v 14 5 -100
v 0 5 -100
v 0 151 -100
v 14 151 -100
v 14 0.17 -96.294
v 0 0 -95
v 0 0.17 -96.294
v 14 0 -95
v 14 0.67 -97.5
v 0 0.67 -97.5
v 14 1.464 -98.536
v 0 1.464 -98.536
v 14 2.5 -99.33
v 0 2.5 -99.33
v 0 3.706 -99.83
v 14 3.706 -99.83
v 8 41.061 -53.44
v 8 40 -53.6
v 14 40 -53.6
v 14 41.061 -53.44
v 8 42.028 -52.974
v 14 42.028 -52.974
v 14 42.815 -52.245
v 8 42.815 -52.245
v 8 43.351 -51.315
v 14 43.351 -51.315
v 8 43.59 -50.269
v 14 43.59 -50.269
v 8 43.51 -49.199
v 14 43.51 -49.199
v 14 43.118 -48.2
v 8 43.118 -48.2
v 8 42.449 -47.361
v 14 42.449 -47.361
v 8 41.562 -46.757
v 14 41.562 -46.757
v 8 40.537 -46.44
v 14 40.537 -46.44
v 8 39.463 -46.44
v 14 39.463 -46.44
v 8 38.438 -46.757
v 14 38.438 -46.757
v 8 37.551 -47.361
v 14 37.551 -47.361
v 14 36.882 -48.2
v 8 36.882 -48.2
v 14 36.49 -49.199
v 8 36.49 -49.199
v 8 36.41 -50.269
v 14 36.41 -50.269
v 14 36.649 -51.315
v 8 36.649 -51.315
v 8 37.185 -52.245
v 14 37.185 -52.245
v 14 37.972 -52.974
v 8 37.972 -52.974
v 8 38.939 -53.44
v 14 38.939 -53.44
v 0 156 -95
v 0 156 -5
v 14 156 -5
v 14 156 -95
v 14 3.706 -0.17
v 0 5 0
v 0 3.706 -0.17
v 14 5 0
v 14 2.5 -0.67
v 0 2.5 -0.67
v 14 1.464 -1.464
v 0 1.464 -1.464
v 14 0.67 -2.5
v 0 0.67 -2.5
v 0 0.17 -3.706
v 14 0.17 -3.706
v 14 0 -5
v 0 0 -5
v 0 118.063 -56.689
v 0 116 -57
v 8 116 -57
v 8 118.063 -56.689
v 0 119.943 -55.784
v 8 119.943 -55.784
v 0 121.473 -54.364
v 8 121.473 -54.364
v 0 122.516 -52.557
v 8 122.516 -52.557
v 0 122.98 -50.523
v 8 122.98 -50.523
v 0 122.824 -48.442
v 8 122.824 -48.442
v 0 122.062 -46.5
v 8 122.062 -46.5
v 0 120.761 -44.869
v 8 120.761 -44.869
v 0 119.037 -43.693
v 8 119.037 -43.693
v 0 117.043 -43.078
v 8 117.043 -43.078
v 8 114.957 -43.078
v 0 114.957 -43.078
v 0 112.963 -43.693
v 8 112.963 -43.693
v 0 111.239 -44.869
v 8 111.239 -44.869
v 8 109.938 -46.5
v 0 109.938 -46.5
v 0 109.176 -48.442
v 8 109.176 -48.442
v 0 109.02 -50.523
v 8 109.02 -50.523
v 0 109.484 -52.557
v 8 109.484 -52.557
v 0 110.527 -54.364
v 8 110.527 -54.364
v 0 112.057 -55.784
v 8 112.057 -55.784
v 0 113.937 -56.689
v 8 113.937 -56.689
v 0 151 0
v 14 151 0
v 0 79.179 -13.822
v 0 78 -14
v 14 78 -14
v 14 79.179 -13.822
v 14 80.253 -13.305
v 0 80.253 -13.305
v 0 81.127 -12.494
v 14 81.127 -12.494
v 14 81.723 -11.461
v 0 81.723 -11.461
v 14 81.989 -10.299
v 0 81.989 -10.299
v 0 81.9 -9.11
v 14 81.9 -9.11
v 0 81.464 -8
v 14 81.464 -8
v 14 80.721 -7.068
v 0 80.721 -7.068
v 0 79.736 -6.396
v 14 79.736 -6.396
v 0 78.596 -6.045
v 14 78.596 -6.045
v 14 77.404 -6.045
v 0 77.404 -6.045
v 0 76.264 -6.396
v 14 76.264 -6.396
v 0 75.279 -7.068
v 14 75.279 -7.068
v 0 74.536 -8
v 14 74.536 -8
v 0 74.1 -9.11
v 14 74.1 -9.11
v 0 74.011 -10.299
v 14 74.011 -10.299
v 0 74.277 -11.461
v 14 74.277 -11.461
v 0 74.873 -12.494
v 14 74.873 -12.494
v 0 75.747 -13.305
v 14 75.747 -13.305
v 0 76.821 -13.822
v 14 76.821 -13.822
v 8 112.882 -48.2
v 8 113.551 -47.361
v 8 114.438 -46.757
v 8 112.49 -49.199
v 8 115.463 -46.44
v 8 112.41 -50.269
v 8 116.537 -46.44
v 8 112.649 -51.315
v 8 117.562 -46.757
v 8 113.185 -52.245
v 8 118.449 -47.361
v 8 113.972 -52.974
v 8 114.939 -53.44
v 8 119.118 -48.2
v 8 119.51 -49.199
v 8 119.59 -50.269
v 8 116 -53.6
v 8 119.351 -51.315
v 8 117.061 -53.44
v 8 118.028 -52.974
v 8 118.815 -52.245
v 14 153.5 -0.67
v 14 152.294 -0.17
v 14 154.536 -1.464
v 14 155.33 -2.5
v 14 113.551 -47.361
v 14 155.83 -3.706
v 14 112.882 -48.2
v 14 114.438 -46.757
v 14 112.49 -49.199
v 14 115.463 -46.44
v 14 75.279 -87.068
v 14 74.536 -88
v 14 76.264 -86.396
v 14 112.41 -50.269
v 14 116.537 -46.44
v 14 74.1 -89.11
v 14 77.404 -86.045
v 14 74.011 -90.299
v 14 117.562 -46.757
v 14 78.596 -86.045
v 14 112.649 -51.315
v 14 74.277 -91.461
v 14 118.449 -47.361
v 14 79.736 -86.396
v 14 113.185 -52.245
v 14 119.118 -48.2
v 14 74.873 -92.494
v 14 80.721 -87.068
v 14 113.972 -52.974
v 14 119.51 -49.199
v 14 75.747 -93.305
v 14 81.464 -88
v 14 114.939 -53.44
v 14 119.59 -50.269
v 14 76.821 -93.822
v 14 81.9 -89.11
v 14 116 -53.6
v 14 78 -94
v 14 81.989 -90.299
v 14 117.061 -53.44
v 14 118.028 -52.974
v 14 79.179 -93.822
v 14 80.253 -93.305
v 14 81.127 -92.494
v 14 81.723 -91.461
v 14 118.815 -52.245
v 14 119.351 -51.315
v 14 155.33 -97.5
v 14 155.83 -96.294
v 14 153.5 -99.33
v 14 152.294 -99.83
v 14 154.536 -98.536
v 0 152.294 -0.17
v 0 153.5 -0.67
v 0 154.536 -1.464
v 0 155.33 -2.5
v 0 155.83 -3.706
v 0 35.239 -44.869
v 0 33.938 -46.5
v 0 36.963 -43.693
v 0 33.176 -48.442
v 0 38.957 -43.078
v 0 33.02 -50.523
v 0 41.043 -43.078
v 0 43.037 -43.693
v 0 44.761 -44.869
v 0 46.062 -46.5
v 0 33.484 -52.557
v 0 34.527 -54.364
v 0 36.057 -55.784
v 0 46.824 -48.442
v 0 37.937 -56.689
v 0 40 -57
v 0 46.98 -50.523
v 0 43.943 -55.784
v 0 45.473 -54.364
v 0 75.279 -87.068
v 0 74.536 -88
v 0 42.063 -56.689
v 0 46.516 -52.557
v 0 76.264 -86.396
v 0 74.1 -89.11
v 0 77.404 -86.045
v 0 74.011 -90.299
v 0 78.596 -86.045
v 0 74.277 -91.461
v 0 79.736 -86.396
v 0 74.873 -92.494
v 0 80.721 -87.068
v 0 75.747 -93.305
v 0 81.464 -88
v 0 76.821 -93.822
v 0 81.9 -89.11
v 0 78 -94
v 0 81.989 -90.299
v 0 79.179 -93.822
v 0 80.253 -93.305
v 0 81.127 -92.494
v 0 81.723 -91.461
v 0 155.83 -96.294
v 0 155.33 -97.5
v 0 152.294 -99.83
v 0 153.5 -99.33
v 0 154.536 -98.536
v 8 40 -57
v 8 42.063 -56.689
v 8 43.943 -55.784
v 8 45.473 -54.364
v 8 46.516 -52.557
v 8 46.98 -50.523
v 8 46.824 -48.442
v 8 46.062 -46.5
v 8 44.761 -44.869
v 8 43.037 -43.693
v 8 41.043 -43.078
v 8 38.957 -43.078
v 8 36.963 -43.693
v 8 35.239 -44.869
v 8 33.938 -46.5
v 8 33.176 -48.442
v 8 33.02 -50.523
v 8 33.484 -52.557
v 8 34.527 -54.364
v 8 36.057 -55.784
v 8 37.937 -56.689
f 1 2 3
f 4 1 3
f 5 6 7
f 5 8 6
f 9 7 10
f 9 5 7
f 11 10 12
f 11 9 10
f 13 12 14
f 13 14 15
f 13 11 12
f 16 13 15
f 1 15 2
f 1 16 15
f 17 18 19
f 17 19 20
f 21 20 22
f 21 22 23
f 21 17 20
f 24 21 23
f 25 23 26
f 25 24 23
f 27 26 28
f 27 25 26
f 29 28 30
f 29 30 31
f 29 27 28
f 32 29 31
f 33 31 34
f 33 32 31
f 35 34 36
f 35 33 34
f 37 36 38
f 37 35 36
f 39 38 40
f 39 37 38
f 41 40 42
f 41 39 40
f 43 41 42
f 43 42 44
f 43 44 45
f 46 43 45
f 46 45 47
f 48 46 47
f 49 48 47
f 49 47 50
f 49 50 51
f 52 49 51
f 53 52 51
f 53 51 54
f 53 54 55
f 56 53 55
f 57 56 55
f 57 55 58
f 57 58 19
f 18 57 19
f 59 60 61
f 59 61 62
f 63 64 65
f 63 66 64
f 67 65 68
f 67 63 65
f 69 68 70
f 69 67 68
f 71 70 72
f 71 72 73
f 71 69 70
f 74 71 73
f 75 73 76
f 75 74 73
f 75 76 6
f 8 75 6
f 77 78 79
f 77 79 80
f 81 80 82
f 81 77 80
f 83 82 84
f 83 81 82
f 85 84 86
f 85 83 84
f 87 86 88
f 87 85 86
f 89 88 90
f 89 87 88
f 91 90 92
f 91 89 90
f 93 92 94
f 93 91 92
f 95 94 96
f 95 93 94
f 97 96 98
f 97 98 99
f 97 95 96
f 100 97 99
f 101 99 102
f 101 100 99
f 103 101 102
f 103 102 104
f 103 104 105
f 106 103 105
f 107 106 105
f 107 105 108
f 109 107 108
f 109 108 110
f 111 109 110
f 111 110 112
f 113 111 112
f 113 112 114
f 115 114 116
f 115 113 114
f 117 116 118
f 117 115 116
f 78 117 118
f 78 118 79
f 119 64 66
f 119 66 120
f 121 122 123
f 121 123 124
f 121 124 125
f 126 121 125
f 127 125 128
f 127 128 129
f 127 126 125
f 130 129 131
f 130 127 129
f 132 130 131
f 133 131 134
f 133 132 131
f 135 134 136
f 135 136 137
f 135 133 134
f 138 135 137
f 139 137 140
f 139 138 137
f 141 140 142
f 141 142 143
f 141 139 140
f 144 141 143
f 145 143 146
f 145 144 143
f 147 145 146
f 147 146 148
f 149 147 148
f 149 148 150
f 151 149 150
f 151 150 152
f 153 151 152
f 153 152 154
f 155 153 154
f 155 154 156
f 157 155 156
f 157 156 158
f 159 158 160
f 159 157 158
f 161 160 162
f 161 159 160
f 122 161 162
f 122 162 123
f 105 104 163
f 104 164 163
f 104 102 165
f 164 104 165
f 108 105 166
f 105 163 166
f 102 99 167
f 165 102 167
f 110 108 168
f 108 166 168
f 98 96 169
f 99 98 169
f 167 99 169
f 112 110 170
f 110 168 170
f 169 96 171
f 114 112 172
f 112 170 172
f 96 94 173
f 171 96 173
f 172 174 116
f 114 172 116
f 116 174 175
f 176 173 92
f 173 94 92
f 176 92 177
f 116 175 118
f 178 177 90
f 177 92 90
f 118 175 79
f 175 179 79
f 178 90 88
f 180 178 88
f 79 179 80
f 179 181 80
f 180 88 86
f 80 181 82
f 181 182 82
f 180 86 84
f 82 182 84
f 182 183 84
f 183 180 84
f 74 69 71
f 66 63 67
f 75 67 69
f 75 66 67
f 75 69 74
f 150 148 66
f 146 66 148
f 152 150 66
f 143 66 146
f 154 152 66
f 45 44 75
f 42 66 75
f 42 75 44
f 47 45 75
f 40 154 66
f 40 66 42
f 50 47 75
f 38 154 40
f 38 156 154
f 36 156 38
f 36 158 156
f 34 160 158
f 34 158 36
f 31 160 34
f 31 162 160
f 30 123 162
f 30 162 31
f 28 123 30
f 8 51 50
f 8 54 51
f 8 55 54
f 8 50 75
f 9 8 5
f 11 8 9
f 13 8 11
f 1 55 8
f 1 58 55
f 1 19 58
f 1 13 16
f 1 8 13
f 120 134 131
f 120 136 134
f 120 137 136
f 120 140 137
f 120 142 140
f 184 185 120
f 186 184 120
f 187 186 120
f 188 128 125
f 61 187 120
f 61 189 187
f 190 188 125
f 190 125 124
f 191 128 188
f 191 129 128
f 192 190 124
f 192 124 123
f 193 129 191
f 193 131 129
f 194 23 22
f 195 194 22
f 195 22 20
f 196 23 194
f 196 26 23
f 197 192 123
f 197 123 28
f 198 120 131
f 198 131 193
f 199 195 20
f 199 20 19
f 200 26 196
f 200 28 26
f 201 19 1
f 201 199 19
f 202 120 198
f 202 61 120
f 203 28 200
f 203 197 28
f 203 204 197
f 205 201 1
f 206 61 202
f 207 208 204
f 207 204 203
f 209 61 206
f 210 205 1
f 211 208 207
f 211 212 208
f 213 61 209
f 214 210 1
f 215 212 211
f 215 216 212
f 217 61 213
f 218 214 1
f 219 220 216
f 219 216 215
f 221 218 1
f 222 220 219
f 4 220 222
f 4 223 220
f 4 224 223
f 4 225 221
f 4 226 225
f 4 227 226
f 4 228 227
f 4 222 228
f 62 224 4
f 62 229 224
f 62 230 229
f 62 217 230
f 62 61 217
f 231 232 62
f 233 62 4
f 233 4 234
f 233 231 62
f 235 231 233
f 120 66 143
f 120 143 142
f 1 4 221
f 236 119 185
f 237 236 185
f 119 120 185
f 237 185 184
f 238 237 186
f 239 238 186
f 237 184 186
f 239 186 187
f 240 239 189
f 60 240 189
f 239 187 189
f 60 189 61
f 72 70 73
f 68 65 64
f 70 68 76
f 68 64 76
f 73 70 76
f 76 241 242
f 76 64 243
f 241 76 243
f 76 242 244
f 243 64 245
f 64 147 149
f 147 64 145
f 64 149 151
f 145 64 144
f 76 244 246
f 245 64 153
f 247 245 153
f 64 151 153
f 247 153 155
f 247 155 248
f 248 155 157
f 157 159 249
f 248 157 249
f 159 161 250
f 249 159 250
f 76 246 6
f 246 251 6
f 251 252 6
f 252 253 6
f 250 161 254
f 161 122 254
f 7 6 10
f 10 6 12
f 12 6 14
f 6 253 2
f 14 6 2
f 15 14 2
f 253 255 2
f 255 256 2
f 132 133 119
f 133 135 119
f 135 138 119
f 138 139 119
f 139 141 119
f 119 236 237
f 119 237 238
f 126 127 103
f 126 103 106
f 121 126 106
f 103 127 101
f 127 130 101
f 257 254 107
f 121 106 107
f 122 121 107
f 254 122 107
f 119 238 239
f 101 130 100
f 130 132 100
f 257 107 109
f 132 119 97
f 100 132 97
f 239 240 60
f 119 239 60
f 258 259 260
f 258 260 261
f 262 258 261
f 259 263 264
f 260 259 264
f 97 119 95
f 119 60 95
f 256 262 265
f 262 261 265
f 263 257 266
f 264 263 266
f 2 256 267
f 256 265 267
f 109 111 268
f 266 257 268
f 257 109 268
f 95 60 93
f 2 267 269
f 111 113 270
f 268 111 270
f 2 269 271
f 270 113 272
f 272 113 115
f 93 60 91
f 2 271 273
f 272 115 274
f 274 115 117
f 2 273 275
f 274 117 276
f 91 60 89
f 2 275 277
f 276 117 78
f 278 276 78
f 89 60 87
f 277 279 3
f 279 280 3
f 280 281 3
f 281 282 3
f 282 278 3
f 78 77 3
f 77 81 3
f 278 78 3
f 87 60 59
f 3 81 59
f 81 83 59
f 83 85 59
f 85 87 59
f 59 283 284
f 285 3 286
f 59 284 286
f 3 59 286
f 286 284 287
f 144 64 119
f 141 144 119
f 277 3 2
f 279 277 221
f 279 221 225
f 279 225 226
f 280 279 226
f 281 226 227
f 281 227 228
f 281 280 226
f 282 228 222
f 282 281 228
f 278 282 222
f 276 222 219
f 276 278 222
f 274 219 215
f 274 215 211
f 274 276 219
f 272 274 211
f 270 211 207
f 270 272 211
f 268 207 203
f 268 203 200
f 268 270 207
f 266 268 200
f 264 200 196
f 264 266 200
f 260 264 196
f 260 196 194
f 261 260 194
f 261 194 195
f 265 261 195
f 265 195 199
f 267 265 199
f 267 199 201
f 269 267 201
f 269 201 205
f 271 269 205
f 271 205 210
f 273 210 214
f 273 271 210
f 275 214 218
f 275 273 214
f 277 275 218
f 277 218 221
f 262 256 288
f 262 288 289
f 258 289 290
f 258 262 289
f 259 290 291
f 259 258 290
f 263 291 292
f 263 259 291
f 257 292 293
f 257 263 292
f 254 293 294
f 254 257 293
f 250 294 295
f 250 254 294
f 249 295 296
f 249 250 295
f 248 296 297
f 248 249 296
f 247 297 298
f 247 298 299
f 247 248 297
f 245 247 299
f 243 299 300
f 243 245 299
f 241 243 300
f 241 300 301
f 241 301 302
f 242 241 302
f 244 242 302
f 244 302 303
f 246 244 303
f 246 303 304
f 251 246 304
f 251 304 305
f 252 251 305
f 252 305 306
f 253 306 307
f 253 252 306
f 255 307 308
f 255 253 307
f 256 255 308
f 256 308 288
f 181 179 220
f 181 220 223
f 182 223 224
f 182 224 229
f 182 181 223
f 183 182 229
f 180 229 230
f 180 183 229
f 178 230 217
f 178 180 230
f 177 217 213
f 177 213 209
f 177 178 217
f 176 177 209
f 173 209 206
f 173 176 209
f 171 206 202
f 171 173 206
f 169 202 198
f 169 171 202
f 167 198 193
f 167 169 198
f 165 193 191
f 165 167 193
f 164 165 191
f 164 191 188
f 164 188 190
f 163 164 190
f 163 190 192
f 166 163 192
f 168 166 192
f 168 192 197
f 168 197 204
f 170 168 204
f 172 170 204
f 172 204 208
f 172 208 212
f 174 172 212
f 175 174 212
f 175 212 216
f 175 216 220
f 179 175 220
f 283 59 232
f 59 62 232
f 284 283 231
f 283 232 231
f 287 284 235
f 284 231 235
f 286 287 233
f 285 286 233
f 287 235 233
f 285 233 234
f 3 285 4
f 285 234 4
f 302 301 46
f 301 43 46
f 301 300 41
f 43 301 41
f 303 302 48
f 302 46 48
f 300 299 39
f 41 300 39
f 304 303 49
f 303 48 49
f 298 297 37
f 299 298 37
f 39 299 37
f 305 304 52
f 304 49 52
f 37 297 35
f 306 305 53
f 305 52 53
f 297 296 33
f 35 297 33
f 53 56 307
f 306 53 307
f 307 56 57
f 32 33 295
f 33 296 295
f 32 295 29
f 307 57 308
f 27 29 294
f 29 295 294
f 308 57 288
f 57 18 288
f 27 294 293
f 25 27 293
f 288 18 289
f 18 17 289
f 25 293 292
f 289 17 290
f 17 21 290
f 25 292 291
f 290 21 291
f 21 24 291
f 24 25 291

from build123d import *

# Parameters (mm, degrees)
SKETCH1_W           = 100
SKETCH1_H           = 156
SKETCH1_R           = 4
SKETCH1_R_2         = 3.6
BOSS_EXTRUDE1_DEPTH = 14
FILLET1_R           = 5
SKETCH1_3_R         = 7
SKETCH1_3_R_2       = 3.6
CUT_EXTRUDE1_DEPTH  = 8


with BuildPart() as part:
    # Sketch1 → Boss-Extrude1 (new body)
    with BuildSketch(Plane(origin=(0, 0, 0), x_dir=(0, 0, -1), z_dir=(1, 0, 0))):
        with Locations((50, 78)):
            Rectangle(SKETCH1_W, SKETCH1_H)
        with Locations((10, 78)):
            Circle(SKETCH1_R, mode=Mode.SUBTRACT)
        with Locations((90, 78)):
            Circle(SKETCH1_R, mode=Mode.SUBTRACT)
        with Locations((50, 40)):
            Circle(SKETCH1_R_2, mode=Mode.SUBTRACT)
        with Locations((50, 116)):
            Circle(SKETCH1_R_2, mode=Mode.SUBTRACT)
    extrude(amount=BOSS_EXTRUDE1_DEPTH)

    # Fillet1
    fillet1_edges = [part.edges().sort_by_distance(p)[0] for p in [
        (7, 156, -100),
        (7, 156, 0),
        (7, 0, 0),
        (7, 0, -100),
    ]]
    fillet(fillet1_edges, radius=FILLET1_R)

    # Sketch1<3> → Cut-Extrude1 (cut)
    # profile 1 of 2: a face of its own
    with BuildSketch(Plane(origin=(0, 0, 0), x_dir=(0, 0, -1), z_dir=(1, 0, 0))):
        with Locations((50, 116)):
            Circle(SKETCH1_3_R)
        with Locations((50, 116)):
            Circle(SKETCH1_3_R_2, mode=Mode.SUBTRACT)
    # profile 2 of 2: a face of its own
    with BuildSketch(Plane(origin=(0, 0, 0), x_dir=(0, 0, -1), z_dir=(1, 0, 0))):
        with Locations((50, 40)):
            Circle(SKETCH1_3_R)
        with Locations((50, 40)):
            Circle(SKETCH1_3_R_2, mode=Mode.SUBTRACT)
    extrude(amount=CUT_EXTRUDE1_DEPTH, mode=Mode.SUBTRACT)


solid = part.part
